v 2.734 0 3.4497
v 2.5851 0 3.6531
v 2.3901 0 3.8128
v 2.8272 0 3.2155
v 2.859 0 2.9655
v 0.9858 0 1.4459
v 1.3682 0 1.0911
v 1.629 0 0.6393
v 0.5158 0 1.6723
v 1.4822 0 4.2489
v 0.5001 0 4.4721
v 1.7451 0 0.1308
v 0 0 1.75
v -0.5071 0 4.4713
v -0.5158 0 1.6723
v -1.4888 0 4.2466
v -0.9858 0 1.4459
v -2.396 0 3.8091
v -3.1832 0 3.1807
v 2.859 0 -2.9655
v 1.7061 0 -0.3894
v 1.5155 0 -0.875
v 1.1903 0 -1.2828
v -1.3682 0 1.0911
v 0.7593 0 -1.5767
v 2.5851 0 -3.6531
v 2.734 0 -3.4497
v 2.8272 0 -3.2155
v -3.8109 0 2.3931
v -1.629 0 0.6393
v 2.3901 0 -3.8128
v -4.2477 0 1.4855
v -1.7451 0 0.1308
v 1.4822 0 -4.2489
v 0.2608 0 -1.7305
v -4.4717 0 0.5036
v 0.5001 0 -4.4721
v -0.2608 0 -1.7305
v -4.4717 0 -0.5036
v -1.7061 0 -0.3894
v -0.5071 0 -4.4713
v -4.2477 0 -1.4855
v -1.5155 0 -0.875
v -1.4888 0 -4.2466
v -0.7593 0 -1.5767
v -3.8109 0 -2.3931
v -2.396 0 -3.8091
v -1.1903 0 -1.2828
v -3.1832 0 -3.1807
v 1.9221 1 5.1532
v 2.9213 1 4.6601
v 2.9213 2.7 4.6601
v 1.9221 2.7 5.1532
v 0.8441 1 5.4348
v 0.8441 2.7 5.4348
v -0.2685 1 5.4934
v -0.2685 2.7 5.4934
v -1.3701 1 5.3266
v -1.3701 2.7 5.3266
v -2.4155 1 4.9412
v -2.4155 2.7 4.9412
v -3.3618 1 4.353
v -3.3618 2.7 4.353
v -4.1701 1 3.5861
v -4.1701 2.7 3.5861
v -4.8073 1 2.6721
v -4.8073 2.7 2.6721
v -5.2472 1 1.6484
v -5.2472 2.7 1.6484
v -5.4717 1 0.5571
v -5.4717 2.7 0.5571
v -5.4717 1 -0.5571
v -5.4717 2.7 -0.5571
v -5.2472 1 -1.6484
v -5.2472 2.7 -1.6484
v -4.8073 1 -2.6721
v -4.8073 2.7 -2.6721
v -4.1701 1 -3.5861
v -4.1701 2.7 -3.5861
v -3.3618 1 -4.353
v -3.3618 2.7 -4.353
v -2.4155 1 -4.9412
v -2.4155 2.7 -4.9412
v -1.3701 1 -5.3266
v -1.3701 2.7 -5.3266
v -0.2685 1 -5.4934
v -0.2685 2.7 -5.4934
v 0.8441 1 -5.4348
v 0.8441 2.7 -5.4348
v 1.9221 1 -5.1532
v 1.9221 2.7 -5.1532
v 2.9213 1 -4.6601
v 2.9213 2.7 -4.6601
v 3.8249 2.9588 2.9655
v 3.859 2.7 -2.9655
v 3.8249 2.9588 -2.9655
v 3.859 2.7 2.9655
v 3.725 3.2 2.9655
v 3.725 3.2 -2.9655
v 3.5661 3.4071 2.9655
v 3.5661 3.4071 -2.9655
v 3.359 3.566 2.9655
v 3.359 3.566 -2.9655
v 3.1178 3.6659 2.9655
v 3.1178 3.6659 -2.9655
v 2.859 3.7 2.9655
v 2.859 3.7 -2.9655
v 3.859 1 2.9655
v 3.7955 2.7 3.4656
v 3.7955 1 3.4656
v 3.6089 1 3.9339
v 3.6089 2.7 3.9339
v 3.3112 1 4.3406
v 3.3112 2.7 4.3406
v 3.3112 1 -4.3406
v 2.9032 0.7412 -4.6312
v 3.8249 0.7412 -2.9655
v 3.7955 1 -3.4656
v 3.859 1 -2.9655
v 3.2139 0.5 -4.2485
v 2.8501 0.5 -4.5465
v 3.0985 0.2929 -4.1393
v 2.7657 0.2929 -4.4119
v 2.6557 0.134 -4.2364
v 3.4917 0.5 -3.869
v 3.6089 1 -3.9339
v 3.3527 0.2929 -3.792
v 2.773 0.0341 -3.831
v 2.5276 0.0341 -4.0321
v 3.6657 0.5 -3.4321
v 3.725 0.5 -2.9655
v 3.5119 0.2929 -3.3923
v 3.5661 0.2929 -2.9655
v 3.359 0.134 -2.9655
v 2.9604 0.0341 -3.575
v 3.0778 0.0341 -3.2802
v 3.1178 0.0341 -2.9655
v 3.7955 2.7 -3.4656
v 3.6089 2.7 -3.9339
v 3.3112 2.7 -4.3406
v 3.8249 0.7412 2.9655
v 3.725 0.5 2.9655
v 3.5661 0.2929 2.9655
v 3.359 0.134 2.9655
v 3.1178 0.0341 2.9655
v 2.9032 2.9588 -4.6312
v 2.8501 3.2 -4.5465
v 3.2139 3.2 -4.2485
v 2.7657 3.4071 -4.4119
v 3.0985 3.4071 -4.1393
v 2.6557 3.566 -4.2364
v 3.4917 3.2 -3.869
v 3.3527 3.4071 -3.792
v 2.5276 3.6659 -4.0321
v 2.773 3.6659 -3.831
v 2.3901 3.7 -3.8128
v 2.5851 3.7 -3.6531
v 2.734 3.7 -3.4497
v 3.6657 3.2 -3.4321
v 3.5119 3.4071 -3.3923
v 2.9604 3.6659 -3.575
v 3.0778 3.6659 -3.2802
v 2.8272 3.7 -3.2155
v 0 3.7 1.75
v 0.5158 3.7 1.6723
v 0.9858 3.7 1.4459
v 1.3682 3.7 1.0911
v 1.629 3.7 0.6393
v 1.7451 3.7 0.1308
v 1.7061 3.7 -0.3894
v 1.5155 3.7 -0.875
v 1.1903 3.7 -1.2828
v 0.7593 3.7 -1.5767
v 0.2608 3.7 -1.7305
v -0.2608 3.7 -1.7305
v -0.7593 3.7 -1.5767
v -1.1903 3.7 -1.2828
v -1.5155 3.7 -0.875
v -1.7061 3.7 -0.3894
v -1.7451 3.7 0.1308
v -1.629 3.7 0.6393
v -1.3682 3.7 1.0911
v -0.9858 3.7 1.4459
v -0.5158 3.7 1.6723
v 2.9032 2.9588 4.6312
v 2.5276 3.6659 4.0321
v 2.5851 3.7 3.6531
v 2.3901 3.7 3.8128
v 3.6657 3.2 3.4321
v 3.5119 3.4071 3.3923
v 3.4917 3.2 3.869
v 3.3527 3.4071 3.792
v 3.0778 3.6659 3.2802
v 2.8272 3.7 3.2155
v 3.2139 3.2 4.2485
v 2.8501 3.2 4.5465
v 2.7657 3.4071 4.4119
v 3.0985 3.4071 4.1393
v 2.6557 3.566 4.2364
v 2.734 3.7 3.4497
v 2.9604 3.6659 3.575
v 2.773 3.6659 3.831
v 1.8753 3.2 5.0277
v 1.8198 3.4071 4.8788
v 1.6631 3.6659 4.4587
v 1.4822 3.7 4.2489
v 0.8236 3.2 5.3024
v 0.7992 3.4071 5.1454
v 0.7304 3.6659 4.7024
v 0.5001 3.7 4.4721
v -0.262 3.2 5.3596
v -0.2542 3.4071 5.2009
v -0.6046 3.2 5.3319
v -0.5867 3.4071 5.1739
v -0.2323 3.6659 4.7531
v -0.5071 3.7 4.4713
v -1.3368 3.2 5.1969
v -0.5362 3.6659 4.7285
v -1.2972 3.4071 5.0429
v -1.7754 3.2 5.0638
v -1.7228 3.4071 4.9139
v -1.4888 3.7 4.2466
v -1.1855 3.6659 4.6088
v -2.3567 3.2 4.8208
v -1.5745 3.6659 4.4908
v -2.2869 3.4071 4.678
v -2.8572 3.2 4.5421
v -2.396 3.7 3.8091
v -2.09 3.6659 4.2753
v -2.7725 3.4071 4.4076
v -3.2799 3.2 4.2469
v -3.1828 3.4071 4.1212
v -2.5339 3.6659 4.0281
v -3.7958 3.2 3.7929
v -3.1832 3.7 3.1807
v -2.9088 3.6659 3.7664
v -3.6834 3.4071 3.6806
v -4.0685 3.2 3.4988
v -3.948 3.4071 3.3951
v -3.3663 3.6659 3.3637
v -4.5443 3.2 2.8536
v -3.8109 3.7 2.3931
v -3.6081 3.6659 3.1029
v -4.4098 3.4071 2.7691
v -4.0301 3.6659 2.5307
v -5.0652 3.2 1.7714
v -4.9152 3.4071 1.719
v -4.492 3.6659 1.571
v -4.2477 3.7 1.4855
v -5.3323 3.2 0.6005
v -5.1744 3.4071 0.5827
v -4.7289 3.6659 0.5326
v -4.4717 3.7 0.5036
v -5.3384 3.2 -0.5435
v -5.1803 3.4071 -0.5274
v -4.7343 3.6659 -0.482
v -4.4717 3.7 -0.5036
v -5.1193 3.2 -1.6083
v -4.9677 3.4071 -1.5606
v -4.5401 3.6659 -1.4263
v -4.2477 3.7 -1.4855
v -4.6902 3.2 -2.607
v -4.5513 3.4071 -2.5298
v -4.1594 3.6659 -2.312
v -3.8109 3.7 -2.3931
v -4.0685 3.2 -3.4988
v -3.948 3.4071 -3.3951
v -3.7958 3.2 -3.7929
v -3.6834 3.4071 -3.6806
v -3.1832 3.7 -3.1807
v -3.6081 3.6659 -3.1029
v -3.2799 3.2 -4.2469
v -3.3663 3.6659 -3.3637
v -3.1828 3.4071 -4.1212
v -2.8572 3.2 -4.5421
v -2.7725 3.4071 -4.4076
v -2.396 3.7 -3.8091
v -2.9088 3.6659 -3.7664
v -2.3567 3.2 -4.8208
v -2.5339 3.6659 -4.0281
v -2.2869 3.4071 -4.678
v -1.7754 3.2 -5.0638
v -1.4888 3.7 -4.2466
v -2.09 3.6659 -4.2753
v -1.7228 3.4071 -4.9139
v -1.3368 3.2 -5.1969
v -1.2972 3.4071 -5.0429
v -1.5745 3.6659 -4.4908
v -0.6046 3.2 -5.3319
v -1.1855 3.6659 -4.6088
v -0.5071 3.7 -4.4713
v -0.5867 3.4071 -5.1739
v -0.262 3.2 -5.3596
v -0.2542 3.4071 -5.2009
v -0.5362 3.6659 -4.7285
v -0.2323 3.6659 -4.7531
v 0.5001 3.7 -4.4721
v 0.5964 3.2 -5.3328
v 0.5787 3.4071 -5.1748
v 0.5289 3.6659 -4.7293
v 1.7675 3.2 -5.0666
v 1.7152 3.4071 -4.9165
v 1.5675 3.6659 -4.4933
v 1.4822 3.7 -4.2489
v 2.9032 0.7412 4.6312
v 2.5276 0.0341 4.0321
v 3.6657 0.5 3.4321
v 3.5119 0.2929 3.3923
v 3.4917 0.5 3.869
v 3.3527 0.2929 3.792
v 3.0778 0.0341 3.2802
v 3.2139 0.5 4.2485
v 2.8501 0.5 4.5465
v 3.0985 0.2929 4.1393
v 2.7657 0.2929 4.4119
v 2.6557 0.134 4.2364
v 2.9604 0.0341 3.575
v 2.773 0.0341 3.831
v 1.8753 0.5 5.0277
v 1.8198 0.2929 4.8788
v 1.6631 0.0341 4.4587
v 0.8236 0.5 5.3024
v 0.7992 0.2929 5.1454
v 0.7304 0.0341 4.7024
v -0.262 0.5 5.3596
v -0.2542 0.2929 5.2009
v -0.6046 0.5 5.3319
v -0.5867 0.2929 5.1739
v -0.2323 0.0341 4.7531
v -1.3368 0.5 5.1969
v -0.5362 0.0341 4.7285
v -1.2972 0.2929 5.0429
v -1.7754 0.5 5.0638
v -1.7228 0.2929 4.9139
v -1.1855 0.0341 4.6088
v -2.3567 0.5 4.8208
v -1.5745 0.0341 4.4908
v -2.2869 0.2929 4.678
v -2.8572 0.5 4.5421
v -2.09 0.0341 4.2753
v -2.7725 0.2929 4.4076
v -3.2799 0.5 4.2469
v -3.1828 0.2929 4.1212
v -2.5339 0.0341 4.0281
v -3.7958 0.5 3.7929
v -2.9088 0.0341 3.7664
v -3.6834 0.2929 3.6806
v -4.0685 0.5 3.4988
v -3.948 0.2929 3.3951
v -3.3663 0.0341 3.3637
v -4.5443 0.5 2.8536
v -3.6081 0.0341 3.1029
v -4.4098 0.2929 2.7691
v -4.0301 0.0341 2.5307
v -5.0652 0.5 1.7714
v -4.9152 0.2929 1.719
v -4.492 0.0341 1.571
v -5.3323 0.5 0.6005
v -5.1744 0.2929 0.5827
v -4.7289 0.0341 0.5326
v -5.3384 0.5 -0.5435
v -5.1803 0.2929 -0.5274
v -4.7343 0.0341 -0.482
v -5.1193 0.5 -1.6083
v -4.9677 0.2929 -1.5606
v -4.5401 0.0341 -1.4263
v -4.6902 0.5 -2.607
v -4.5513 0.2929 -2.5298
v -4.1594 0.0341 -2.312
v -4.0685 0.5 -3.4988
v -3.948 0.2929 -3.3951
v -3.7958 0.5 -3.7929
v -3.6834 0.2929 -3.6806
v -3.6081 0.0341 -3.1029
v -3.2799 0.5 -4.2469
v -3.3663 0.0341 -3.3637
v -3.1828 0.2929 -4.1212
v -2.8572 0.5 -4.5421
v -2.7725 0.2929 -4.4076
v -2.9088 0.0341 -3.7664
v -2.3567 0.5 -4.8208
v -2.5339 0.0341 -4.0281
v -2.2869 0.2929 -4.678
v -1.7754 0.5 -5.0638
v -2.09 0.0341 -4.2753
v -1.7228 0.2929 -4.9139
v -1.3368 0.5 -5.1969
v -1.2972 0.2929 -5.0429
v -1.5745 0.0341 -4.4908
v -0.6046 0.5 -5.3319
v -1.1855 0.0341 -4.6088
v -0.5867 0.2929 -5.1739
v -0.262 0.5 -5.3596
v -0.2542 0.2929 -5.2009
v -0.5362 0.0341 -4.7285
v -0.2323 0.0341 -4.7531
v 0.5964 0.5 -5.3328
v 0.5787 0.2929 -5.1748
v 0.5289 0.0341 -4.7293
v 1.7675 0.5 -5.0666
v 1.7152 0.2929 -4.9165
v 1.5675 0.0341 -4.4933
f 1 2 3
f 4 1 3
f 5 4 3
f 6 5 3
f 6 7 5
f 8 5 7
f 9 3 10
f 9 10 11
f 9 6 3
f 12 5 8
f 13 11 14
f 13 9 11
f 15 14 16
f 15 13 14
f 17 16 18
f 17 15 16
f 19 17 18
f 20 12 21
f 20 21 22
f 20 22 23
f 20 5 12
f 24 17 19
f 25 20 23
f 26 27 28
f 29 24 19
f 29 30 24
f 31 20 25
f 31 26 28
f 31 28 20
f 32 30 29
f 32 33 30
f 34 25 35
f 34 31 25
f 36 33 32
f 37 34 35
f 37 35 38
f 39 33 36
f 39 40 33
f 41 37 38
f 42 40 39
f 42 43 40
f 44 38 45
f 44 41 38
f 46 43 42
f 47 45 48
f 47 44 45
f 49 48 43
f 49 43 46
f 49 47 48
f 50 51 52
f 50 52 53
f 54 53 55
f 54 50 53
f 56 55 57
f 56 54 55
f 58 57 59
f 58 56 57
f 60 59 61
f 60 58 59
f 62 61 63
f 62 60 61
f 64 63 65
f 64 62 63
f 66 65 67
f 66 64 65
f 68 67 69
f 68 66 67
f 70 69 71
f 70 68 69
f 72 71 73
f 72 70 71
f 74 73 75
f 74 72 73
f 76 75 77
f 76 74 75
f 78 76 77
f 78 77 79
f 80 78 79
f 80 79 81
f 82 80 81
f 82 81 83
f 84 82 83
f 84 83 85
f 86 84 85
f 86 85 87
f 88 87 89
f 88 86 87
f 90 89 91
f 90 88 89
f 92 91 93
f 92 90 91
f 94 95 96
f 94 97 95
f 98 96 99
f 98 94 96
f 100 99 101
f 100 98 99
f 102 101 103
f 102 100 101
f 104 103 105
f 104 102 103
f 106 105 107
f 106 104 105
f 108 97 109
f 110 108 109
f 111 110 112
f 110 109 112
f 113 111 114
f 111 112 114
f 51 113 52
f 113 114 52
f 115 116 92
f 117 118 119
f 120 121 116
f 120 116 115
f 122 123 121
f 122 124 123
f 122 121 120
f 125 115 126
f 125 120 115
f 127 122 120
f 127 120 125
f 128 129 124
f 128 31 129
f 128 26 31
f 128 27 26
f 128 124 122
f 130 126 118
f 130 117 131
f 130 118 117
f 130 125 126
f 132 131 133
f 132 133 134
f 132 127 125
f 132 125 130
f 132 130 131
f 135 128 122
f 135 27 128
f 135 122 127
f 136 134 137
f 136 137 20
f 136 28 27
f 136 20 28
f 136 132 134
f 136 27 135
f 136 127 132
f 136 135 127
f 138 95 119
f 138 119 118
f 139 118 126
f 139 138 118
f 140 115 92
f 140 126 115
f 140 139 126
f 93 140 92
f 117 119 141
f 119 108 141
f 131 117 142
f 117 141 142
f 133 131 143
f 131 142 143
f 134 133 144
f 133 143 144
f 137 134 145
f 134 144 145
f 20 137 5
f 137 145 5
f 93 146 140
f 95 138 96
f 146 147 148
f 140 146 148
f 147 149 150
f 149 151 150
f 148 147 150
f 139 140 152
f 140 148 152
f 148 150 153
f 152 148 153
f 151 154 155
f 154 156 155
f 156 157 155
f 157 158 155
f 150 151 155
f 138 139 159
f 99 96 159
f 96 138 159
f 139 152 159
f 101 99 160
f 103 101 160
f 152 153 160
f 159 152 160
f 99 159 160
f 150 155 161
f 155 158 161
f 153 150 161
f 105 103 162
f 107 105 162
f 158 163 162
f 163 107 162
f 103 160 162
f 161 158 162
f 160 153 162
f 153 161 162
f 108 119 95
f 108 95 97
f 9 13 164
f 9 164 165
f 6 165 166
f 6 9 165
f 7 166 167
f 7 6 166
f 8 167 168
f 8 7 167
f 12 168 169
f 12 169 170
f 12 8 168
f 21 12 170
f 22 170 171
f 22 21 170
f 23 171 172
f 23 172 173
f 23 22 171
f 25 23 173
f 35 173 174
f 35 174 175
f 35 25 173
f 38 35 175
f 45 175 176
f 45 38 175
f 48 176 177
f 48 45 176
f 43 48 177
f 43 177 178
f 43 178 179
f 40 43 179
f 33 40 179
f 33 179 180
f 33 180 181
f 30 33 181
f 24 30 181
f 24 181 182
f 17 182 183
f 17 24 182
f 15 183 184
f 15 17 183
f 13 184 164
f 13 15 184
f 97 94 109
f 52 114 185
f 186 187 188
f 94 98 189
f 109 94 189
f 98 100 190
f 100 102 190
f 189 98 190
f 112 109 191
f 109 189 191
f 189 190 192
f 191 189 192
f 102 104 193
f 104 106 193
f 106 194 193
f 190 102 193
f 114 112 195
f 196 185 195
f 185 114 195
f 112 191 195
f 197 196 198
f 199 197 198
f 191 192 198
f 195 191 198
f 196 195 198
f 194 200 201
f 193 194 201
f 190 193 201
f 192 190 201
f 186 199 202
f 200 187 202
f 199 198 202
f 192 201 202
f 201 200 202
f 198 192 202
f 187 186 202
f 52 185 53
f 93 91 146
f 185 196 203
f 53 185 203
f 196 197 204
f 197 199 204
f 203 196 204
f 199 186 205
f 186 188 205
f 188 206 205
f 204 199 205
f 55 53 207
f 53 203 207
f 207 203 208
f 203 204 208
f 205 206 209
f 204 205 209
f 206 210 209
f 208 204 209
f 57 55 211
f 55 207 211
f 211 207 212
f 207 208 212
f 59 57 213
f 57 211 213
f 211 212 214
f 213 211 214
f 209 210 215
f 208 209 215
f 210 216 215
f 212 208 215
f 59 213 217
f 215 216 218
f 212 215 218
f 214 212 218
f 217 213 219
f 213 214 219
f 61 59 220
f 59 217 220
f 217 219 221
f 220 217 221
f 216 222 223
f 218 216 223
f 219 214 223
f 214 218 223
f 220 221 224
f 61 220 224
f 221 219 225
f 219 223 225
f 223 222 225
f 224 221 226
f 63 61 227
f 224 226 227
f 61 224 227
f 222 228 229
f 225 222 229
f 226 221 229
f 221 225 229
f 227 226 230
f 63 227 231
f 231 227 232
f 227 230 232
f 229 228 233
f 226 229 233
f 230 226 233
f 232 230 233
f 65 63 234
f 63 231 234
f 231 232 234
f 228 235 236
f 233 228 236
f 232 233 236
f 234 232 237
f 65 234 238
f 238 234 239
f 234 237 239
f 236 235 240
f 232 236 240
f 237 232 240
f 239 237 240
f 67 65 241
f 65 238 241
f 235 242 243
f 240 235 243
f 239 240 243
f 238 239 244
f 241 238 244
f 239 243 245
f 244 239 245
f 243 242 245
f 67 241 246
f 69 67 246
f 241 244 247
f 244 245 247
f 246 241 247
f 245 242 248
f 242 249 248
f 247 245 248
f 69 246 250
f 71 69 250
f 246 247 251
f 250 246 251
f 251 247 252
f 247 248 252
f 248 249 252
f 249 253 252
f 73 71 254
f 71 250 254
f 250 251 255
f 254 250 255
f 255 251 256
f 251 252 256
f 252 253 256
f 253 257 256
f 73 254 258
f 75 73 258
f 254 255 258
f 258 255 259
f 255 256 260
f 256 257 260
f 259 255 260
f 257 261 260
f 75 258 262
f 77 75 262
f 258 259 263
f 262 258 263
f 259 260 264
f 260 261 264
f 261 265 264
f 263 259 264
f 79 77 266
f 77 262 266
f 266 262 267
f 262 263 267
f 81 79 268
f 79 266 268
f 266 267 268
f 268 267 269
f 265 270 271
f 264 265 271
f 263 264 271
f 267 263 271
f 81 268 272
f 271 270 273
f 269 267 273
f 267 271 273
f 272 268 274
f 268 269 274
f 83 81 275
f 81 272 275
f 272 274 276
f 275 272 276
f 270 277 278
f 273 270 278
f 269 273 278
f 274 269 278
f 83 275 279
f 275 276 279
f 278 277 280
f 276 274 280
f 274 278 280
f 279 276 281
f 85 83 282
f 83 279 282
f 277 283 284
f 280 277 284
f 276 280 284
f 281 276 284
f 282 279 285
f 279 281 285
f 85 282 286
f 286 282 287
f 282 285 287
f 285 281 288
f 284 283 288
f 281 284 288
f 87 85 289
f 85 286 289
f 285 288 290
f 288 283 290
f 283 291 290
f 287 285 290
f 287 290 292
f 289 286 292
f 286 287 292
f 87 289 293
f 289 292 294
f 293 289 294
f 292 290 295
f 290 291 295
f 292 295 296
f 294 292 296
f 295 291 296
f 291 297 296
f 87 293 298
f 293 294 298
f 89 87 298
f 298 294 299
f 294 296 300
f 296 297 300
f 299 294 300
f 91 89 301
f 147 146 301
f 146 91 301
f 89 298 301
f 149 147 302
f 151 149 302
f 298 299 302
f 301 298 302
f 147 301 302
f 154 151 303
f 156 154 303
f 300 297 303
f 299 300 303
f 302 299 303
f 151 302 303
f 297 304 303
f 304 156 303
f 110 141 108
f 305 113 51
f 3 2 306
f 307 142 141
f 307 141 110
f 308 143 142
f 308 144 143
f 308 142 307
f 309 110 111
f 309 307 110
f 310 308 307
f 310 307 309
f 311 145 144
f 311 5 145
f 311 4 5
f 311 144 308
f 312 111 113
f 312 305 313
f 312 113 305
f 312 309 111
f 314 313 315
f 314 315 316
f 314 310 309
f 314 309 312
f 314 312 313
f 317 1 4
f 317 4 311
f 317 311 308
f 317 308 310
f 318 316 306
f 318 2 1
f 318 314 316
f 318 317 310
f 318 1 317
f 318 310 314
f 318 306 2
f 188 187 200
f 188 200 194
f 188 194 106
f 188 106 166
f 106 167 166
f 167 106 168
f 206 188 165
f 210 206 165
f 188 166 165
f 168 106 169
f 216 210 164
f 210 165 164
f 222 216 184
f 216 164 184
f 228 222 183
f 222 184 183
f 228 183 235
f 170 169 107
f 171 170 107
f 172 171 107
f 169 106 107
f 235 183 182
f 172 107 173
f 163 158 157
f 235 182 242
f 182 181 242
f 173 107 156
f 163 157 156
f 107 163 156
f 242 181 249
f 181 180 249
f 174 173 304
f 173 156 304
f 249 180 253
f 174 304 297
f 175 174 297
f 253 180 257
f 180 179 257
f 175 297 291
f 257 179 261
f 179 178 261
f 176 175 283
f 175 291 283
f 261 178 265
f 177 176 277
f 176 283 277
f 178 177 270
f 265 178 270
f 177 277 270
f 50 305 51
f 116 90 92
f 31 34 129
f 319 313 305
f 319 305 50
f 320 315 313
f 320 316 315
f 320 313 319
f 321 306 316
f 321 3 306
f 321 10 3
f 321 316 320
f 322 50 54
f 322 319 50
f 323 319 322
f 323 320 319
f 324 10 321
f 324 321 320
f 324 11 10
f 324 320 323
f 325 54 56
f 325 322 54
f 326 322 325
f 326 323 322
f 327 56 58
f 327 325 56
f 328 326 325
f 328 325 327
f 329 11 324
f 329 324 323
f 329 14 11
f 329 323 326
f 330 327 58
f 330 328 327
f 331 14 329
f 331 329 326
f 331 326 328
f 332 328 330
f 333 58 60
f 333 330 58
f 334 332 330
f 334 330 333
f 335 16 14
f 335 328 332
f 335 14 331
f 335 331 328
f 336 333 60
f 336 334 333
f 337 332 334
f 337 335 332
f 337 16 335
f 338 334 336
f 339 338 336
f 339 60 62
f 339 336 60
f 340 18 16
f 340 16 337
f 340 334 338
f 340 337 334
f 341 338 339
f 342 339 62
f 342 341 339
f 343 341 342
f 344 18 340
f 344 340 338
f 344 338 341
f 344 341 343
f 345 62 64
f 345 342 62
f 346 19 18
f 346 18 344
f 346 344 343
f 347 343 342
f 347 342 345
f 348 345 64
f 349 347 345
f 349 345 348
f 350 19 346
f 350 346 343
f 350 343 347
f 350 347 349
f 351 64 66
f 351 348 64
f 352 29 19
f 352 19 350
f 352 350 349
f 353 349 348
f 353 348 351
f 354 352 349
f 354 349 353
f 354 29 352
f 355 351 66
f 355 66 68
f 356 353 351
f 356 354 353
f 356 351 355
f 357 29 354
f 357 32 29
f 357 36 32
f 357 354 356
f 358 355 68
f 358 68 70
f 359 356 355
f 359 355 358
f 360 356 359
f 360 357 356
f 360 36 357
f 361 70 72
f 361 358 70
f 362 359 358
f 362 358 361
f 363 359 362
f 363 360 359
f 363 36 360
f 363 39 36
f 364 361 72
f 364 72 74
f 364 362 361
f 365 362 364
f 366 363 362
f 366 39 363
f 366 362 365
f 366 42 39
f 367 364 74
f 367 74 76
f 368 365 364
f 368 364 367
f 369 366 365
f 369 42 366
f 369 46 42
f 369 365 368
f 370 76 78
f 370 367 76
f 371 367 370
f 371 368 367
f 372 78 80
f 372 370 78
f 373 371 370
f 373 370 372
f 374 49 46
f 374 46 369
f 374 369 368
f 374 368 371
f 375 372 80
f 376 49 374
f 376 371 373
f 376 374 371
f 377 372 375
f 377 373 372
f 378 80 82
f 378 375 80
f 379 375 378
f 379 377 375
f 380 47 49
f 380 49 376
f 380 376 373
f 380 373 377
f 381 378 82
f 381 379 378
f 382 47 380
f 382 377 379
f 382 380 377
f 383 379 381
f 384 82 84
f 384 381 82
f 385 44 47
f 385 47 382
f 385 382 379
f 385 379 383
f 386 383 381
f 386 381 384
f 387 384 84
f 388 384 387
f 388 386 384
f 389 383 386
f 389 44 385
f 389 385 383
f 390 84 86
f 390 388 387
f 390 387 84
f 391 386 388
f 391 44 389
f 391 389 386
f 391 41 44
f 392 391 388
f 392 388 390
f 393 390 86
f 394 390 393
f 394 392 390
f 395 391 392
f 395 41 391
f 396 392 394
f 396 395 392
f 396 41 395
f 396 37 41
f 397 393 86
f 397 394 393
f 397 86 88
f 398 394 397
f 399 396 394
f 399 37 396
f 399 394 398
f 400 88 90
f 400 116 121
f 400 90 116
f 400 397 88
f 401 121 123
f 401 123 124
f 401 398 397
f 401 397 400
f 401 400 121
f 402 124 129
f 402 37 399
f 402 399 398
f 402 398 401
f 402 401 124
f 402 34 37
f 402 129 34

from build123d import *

# Parameters (mm, degrees)
CROQUIS1_R              = 1.75
SALIENTE_EXTRUIR1_DEPTH = 3.7
REDONDEO1_R             = 2
REDONDEO2_R             = 1


with BuildPart() as part:
    # Croquis1 → Saliente-Extruir1 (new body)
    with BuildSketch(Plane(origin=(0, 0, 0), x_dir=(1, 0, 0), z_dir=(0, 1, 0))):
        with BuildLine():
            Line((3.858987824, 3.918955597), (3.858987824, -3.918955597))
            ThreePointArc((3.858987824, -3.918955597), (-5.5, 0), (3.858987824, 3.918955597))
        make_face()
        with Locations(Location((0, 0, 0), (0, 0, 270))):
            Circle(CROQUIS1_R, mode=Mode.SUBTRACT)
    extrude(amount=SALIENTE_EXTRUIR1_DEPTH)

    # Redondeo1
    redondeo1_edges = [part.edges().sort_by_distance(p)[0] for p in [
        (3.858987824, 1.85, -3.918955597),
        (3.858987824, 1.85, 3.918955597),
    ]]
    fillet(redondeo1_edges, radius=REDONDEO1_R)

    # Redondeo2
    redondeo2_edges = [part.edges().sort_by_distance(p)[0] for p in [
        (3.858987824, 0, 0),
        (3.858987824, 3.7, 0),
        (-5.5, 0, 0),
        (3.60892461, 0, -3.933855699),
        (3.60892461, 0, 3.933855699),
        (-5.5, 3.7, 0),
        (3.60892461, 3.7, -3.933855699),
        (3.60892461, 3.7, 3.933855699),
    ]]
    fillet(redondeo2_edges, radius=REDONDEO2_R)


solid = part.part
